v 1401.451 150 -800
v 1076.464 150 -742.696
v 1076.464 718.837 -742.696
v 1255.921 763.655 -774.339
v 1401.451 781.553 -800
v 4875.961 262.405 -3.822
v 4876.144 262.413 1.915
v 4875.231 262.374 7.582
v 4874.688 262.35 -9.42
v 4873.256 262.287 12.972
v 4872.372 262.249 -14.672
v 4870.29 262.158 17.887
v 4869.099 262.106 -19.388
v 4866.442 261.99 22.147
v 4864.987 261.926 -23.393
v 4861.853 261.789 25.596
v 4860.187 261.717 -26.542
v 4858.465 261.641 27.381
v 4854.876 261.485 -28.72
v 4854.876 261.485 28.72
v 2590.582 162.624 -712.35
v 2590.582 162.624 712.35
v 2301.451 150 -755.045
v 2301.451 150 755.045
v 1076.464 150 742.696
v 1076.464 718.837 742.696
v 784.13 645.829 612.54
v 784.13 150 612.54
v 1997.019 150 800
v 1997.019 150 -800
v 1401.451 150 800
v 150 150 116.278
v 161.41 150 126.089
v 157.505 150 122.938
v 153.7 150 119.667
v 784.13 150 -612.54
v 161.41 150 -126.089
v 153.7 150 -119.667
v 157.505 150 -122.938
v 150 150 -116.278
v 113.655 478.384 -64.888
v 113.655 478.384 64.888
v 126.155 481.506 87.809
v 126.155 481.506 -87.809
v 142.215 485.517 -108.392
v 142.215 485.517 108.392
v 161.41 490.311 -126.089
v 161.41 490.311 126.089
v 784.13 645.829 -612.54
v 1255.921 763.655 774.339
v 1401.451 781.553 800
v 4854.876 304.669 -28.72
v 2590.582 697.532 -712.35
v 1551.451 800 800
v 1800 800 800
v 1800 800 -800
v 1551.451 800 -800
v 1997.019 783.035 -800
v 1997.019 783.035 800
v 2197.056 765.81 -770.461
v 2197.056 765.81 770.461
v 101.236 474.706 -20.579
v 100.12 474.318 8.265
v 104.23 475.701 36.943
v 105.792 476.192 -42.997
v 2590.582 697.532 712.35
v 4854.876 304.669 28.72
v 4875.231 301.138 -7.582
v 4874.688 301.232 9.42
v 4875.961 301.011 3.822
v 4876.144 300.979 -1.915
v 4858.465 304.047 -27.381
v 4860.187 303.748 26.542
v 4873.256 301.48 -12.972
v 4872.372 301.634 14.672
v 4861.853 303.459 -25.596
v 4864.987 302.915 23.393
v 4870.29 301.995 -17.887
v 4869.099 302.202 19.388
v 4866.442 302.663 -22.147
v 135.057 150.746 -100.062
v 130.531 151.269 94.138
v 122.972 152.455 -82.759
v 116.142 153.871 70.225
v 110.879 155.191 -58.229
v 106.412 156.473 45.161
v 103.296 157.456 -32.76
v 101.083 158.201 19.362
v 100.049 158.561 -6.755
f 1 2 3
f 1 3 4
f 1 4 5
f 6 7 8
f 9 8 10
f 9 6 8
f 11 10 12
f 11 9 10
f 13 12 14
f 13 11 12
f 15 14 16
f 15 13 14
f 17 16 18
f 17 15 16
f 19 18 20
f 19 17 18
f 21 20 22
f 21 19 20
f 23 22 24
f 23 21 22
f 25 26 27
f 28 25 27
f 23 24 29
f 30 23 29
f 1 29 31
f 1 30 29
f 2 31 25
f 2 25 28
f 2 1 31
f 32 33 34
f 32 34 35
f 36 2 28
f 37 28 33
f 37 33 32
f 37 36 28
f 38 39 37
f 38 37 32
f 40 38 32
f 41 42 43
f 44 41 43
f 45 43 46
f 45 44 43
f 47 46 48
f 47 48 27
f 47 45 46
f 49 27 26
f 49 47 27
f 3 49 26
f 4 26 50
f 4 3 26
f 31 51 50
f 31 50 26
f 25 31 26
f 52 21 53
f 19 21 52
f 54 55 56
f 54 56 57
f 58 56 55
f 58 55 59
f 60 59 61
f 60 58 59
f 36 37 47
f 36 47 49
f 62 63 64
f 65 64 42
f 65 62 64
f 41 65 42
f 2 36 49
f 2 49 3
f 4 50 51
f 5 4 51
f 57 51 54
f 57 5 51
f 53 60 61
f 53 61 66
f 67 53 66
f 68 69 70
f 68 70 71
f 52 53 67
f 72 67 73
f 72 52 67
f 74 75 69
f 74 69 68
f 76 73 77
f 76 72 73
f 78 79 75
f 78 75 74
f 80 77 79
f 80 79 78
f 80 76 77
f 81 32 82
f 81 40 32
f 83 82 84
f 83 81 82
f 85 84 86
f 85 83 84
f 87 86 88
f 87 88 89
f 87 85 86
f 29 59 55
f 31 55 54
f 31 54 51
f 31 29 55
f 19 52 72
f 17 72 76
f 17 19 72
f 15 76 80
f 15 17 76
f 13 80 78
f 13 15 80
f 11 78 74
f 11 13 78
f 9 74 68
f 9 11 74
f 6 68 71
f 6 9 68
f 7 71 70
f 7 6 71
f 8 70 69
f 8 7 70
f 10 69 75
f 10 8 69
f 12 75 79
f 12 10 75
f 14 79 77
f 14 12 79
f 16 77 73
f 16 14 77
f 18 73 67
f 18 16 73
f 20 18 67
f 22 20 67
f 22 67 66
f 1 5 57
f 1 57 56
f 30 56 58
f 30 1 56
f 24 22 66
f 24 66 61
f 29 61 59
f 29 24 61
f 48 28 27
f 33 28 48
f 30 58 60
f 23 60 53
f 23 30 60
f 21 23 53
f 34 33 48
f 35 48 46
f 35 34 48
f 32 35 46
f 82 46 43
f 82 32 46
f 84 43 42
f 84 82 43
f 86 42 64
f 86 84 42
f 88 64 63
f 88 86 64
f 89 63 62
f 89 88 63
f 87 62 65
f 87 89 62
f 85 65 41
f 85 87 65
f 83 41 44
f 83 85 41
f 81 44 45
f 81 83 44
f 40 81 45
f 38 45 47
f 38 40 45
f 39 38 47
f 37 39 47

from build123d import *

# Parameters (mm, degrees)
TOPVIEW_EXTRUDE_DEPTH      = 800
SIDEPROFILE_CUT_DEPTH      = 5006.734380578
SIDEPROFILE_CUT_DEPTH_BACK = 5006.734380578
SKETCH2_OUTSIDE_W          = 5798.358
SKETCH2_OUTSIDE_H          = 1822.06


with BuildPart() as part:
    # Sketch1 → TopView_Extrude (new body)
    with BuildSketch(Plane(origin=(0, 0, 0), x_dir=(1, 0, 0), z_dir=(0, 1, 0))):
        with BuildLine():
            Line((161.409759475, 126.088702216), (784.13, 612.54))
            Line((784.13, 612.54), (1076.464, 742.696))
            Line((1076.464, 742.696), (1401.451, 800))
            Line((1401.451, 800), (1997.019, 800))
            Line((1997.019, 800), (2590.582, 712.35))
            Line((2590.582, 712.35), (4854.876103105, 28.719585912))
            ThreePointArc((4854.876103105, 28.719585912), (4876.205152462, 0), (4854.876103105, -28.719585912))
            Line((4854.876103105, -28.719585912), (2590.582, -712.35))
            Line((2590.582, -712.35), (1997.019, -800))
            Line((1997.019, -800), (1401.451, -800))
            Line((1401.451, -800), (1076.464, -742.696))
            Line((1076.464, -742.696), (784.13, -612.54))
            Line((784.13, -612.54), (161.409759475, -126.088702216))
            ThreePointArc((161.409759475, -126.088702216), (99.906658784, 0), (161.409759475, 126.088702216))
        make_face()
    extrude(amount=TOPVIEW_EXTRUDE_DEPTH)

    # Sketch2 outside → SideProfile_Cut (cut, two sides: drawn at the far end of the back side and taken through both)
    with BuildSketch(Plane.XY.offset(-SIDEPROFILE_CUT_DEPTH_BACK)):
        with Locations((2488.056, 400)):
            Rectangle(SKETCH2_OUTSIDE_W, SKETCH2_OUTSIDE_H)
        with BuildLine():
            Line((0, 300), (0, 332.854109989))
            ThreePointArc((0, 332.854109989), (31.780435884, 425.180350356), (113.655128803, 478.384348558))
            Line((113.655128803, 478.384348558), (1255.921, 763.655))
            Line((1255.921, 763.655), (1551.451, 800))
            Line((1551.451, 800), (1800, 800))
            Line((1800, 800), (2197.056, 765.81))
            Line((2197.056, 765.81), (4950, 288.165))
            Line((4950, 288.165), (4950, 265.638))
            Line((4950, 265.638), (2301.451, 150))
            Line((2301.451, 150), (150, 150))
            ThreePointArc((150, 150), (43.933982822, 193.933982822), (0, 300))
        make_face(mode=Mode.SUBTRACT)
    extrude(amount=SIDEPROFILE_CUT_DEPTH + SIDEPROFILE_CUT_DEPTH_BACK, mode=Mode.SUBTRACT)


solid = part.part
